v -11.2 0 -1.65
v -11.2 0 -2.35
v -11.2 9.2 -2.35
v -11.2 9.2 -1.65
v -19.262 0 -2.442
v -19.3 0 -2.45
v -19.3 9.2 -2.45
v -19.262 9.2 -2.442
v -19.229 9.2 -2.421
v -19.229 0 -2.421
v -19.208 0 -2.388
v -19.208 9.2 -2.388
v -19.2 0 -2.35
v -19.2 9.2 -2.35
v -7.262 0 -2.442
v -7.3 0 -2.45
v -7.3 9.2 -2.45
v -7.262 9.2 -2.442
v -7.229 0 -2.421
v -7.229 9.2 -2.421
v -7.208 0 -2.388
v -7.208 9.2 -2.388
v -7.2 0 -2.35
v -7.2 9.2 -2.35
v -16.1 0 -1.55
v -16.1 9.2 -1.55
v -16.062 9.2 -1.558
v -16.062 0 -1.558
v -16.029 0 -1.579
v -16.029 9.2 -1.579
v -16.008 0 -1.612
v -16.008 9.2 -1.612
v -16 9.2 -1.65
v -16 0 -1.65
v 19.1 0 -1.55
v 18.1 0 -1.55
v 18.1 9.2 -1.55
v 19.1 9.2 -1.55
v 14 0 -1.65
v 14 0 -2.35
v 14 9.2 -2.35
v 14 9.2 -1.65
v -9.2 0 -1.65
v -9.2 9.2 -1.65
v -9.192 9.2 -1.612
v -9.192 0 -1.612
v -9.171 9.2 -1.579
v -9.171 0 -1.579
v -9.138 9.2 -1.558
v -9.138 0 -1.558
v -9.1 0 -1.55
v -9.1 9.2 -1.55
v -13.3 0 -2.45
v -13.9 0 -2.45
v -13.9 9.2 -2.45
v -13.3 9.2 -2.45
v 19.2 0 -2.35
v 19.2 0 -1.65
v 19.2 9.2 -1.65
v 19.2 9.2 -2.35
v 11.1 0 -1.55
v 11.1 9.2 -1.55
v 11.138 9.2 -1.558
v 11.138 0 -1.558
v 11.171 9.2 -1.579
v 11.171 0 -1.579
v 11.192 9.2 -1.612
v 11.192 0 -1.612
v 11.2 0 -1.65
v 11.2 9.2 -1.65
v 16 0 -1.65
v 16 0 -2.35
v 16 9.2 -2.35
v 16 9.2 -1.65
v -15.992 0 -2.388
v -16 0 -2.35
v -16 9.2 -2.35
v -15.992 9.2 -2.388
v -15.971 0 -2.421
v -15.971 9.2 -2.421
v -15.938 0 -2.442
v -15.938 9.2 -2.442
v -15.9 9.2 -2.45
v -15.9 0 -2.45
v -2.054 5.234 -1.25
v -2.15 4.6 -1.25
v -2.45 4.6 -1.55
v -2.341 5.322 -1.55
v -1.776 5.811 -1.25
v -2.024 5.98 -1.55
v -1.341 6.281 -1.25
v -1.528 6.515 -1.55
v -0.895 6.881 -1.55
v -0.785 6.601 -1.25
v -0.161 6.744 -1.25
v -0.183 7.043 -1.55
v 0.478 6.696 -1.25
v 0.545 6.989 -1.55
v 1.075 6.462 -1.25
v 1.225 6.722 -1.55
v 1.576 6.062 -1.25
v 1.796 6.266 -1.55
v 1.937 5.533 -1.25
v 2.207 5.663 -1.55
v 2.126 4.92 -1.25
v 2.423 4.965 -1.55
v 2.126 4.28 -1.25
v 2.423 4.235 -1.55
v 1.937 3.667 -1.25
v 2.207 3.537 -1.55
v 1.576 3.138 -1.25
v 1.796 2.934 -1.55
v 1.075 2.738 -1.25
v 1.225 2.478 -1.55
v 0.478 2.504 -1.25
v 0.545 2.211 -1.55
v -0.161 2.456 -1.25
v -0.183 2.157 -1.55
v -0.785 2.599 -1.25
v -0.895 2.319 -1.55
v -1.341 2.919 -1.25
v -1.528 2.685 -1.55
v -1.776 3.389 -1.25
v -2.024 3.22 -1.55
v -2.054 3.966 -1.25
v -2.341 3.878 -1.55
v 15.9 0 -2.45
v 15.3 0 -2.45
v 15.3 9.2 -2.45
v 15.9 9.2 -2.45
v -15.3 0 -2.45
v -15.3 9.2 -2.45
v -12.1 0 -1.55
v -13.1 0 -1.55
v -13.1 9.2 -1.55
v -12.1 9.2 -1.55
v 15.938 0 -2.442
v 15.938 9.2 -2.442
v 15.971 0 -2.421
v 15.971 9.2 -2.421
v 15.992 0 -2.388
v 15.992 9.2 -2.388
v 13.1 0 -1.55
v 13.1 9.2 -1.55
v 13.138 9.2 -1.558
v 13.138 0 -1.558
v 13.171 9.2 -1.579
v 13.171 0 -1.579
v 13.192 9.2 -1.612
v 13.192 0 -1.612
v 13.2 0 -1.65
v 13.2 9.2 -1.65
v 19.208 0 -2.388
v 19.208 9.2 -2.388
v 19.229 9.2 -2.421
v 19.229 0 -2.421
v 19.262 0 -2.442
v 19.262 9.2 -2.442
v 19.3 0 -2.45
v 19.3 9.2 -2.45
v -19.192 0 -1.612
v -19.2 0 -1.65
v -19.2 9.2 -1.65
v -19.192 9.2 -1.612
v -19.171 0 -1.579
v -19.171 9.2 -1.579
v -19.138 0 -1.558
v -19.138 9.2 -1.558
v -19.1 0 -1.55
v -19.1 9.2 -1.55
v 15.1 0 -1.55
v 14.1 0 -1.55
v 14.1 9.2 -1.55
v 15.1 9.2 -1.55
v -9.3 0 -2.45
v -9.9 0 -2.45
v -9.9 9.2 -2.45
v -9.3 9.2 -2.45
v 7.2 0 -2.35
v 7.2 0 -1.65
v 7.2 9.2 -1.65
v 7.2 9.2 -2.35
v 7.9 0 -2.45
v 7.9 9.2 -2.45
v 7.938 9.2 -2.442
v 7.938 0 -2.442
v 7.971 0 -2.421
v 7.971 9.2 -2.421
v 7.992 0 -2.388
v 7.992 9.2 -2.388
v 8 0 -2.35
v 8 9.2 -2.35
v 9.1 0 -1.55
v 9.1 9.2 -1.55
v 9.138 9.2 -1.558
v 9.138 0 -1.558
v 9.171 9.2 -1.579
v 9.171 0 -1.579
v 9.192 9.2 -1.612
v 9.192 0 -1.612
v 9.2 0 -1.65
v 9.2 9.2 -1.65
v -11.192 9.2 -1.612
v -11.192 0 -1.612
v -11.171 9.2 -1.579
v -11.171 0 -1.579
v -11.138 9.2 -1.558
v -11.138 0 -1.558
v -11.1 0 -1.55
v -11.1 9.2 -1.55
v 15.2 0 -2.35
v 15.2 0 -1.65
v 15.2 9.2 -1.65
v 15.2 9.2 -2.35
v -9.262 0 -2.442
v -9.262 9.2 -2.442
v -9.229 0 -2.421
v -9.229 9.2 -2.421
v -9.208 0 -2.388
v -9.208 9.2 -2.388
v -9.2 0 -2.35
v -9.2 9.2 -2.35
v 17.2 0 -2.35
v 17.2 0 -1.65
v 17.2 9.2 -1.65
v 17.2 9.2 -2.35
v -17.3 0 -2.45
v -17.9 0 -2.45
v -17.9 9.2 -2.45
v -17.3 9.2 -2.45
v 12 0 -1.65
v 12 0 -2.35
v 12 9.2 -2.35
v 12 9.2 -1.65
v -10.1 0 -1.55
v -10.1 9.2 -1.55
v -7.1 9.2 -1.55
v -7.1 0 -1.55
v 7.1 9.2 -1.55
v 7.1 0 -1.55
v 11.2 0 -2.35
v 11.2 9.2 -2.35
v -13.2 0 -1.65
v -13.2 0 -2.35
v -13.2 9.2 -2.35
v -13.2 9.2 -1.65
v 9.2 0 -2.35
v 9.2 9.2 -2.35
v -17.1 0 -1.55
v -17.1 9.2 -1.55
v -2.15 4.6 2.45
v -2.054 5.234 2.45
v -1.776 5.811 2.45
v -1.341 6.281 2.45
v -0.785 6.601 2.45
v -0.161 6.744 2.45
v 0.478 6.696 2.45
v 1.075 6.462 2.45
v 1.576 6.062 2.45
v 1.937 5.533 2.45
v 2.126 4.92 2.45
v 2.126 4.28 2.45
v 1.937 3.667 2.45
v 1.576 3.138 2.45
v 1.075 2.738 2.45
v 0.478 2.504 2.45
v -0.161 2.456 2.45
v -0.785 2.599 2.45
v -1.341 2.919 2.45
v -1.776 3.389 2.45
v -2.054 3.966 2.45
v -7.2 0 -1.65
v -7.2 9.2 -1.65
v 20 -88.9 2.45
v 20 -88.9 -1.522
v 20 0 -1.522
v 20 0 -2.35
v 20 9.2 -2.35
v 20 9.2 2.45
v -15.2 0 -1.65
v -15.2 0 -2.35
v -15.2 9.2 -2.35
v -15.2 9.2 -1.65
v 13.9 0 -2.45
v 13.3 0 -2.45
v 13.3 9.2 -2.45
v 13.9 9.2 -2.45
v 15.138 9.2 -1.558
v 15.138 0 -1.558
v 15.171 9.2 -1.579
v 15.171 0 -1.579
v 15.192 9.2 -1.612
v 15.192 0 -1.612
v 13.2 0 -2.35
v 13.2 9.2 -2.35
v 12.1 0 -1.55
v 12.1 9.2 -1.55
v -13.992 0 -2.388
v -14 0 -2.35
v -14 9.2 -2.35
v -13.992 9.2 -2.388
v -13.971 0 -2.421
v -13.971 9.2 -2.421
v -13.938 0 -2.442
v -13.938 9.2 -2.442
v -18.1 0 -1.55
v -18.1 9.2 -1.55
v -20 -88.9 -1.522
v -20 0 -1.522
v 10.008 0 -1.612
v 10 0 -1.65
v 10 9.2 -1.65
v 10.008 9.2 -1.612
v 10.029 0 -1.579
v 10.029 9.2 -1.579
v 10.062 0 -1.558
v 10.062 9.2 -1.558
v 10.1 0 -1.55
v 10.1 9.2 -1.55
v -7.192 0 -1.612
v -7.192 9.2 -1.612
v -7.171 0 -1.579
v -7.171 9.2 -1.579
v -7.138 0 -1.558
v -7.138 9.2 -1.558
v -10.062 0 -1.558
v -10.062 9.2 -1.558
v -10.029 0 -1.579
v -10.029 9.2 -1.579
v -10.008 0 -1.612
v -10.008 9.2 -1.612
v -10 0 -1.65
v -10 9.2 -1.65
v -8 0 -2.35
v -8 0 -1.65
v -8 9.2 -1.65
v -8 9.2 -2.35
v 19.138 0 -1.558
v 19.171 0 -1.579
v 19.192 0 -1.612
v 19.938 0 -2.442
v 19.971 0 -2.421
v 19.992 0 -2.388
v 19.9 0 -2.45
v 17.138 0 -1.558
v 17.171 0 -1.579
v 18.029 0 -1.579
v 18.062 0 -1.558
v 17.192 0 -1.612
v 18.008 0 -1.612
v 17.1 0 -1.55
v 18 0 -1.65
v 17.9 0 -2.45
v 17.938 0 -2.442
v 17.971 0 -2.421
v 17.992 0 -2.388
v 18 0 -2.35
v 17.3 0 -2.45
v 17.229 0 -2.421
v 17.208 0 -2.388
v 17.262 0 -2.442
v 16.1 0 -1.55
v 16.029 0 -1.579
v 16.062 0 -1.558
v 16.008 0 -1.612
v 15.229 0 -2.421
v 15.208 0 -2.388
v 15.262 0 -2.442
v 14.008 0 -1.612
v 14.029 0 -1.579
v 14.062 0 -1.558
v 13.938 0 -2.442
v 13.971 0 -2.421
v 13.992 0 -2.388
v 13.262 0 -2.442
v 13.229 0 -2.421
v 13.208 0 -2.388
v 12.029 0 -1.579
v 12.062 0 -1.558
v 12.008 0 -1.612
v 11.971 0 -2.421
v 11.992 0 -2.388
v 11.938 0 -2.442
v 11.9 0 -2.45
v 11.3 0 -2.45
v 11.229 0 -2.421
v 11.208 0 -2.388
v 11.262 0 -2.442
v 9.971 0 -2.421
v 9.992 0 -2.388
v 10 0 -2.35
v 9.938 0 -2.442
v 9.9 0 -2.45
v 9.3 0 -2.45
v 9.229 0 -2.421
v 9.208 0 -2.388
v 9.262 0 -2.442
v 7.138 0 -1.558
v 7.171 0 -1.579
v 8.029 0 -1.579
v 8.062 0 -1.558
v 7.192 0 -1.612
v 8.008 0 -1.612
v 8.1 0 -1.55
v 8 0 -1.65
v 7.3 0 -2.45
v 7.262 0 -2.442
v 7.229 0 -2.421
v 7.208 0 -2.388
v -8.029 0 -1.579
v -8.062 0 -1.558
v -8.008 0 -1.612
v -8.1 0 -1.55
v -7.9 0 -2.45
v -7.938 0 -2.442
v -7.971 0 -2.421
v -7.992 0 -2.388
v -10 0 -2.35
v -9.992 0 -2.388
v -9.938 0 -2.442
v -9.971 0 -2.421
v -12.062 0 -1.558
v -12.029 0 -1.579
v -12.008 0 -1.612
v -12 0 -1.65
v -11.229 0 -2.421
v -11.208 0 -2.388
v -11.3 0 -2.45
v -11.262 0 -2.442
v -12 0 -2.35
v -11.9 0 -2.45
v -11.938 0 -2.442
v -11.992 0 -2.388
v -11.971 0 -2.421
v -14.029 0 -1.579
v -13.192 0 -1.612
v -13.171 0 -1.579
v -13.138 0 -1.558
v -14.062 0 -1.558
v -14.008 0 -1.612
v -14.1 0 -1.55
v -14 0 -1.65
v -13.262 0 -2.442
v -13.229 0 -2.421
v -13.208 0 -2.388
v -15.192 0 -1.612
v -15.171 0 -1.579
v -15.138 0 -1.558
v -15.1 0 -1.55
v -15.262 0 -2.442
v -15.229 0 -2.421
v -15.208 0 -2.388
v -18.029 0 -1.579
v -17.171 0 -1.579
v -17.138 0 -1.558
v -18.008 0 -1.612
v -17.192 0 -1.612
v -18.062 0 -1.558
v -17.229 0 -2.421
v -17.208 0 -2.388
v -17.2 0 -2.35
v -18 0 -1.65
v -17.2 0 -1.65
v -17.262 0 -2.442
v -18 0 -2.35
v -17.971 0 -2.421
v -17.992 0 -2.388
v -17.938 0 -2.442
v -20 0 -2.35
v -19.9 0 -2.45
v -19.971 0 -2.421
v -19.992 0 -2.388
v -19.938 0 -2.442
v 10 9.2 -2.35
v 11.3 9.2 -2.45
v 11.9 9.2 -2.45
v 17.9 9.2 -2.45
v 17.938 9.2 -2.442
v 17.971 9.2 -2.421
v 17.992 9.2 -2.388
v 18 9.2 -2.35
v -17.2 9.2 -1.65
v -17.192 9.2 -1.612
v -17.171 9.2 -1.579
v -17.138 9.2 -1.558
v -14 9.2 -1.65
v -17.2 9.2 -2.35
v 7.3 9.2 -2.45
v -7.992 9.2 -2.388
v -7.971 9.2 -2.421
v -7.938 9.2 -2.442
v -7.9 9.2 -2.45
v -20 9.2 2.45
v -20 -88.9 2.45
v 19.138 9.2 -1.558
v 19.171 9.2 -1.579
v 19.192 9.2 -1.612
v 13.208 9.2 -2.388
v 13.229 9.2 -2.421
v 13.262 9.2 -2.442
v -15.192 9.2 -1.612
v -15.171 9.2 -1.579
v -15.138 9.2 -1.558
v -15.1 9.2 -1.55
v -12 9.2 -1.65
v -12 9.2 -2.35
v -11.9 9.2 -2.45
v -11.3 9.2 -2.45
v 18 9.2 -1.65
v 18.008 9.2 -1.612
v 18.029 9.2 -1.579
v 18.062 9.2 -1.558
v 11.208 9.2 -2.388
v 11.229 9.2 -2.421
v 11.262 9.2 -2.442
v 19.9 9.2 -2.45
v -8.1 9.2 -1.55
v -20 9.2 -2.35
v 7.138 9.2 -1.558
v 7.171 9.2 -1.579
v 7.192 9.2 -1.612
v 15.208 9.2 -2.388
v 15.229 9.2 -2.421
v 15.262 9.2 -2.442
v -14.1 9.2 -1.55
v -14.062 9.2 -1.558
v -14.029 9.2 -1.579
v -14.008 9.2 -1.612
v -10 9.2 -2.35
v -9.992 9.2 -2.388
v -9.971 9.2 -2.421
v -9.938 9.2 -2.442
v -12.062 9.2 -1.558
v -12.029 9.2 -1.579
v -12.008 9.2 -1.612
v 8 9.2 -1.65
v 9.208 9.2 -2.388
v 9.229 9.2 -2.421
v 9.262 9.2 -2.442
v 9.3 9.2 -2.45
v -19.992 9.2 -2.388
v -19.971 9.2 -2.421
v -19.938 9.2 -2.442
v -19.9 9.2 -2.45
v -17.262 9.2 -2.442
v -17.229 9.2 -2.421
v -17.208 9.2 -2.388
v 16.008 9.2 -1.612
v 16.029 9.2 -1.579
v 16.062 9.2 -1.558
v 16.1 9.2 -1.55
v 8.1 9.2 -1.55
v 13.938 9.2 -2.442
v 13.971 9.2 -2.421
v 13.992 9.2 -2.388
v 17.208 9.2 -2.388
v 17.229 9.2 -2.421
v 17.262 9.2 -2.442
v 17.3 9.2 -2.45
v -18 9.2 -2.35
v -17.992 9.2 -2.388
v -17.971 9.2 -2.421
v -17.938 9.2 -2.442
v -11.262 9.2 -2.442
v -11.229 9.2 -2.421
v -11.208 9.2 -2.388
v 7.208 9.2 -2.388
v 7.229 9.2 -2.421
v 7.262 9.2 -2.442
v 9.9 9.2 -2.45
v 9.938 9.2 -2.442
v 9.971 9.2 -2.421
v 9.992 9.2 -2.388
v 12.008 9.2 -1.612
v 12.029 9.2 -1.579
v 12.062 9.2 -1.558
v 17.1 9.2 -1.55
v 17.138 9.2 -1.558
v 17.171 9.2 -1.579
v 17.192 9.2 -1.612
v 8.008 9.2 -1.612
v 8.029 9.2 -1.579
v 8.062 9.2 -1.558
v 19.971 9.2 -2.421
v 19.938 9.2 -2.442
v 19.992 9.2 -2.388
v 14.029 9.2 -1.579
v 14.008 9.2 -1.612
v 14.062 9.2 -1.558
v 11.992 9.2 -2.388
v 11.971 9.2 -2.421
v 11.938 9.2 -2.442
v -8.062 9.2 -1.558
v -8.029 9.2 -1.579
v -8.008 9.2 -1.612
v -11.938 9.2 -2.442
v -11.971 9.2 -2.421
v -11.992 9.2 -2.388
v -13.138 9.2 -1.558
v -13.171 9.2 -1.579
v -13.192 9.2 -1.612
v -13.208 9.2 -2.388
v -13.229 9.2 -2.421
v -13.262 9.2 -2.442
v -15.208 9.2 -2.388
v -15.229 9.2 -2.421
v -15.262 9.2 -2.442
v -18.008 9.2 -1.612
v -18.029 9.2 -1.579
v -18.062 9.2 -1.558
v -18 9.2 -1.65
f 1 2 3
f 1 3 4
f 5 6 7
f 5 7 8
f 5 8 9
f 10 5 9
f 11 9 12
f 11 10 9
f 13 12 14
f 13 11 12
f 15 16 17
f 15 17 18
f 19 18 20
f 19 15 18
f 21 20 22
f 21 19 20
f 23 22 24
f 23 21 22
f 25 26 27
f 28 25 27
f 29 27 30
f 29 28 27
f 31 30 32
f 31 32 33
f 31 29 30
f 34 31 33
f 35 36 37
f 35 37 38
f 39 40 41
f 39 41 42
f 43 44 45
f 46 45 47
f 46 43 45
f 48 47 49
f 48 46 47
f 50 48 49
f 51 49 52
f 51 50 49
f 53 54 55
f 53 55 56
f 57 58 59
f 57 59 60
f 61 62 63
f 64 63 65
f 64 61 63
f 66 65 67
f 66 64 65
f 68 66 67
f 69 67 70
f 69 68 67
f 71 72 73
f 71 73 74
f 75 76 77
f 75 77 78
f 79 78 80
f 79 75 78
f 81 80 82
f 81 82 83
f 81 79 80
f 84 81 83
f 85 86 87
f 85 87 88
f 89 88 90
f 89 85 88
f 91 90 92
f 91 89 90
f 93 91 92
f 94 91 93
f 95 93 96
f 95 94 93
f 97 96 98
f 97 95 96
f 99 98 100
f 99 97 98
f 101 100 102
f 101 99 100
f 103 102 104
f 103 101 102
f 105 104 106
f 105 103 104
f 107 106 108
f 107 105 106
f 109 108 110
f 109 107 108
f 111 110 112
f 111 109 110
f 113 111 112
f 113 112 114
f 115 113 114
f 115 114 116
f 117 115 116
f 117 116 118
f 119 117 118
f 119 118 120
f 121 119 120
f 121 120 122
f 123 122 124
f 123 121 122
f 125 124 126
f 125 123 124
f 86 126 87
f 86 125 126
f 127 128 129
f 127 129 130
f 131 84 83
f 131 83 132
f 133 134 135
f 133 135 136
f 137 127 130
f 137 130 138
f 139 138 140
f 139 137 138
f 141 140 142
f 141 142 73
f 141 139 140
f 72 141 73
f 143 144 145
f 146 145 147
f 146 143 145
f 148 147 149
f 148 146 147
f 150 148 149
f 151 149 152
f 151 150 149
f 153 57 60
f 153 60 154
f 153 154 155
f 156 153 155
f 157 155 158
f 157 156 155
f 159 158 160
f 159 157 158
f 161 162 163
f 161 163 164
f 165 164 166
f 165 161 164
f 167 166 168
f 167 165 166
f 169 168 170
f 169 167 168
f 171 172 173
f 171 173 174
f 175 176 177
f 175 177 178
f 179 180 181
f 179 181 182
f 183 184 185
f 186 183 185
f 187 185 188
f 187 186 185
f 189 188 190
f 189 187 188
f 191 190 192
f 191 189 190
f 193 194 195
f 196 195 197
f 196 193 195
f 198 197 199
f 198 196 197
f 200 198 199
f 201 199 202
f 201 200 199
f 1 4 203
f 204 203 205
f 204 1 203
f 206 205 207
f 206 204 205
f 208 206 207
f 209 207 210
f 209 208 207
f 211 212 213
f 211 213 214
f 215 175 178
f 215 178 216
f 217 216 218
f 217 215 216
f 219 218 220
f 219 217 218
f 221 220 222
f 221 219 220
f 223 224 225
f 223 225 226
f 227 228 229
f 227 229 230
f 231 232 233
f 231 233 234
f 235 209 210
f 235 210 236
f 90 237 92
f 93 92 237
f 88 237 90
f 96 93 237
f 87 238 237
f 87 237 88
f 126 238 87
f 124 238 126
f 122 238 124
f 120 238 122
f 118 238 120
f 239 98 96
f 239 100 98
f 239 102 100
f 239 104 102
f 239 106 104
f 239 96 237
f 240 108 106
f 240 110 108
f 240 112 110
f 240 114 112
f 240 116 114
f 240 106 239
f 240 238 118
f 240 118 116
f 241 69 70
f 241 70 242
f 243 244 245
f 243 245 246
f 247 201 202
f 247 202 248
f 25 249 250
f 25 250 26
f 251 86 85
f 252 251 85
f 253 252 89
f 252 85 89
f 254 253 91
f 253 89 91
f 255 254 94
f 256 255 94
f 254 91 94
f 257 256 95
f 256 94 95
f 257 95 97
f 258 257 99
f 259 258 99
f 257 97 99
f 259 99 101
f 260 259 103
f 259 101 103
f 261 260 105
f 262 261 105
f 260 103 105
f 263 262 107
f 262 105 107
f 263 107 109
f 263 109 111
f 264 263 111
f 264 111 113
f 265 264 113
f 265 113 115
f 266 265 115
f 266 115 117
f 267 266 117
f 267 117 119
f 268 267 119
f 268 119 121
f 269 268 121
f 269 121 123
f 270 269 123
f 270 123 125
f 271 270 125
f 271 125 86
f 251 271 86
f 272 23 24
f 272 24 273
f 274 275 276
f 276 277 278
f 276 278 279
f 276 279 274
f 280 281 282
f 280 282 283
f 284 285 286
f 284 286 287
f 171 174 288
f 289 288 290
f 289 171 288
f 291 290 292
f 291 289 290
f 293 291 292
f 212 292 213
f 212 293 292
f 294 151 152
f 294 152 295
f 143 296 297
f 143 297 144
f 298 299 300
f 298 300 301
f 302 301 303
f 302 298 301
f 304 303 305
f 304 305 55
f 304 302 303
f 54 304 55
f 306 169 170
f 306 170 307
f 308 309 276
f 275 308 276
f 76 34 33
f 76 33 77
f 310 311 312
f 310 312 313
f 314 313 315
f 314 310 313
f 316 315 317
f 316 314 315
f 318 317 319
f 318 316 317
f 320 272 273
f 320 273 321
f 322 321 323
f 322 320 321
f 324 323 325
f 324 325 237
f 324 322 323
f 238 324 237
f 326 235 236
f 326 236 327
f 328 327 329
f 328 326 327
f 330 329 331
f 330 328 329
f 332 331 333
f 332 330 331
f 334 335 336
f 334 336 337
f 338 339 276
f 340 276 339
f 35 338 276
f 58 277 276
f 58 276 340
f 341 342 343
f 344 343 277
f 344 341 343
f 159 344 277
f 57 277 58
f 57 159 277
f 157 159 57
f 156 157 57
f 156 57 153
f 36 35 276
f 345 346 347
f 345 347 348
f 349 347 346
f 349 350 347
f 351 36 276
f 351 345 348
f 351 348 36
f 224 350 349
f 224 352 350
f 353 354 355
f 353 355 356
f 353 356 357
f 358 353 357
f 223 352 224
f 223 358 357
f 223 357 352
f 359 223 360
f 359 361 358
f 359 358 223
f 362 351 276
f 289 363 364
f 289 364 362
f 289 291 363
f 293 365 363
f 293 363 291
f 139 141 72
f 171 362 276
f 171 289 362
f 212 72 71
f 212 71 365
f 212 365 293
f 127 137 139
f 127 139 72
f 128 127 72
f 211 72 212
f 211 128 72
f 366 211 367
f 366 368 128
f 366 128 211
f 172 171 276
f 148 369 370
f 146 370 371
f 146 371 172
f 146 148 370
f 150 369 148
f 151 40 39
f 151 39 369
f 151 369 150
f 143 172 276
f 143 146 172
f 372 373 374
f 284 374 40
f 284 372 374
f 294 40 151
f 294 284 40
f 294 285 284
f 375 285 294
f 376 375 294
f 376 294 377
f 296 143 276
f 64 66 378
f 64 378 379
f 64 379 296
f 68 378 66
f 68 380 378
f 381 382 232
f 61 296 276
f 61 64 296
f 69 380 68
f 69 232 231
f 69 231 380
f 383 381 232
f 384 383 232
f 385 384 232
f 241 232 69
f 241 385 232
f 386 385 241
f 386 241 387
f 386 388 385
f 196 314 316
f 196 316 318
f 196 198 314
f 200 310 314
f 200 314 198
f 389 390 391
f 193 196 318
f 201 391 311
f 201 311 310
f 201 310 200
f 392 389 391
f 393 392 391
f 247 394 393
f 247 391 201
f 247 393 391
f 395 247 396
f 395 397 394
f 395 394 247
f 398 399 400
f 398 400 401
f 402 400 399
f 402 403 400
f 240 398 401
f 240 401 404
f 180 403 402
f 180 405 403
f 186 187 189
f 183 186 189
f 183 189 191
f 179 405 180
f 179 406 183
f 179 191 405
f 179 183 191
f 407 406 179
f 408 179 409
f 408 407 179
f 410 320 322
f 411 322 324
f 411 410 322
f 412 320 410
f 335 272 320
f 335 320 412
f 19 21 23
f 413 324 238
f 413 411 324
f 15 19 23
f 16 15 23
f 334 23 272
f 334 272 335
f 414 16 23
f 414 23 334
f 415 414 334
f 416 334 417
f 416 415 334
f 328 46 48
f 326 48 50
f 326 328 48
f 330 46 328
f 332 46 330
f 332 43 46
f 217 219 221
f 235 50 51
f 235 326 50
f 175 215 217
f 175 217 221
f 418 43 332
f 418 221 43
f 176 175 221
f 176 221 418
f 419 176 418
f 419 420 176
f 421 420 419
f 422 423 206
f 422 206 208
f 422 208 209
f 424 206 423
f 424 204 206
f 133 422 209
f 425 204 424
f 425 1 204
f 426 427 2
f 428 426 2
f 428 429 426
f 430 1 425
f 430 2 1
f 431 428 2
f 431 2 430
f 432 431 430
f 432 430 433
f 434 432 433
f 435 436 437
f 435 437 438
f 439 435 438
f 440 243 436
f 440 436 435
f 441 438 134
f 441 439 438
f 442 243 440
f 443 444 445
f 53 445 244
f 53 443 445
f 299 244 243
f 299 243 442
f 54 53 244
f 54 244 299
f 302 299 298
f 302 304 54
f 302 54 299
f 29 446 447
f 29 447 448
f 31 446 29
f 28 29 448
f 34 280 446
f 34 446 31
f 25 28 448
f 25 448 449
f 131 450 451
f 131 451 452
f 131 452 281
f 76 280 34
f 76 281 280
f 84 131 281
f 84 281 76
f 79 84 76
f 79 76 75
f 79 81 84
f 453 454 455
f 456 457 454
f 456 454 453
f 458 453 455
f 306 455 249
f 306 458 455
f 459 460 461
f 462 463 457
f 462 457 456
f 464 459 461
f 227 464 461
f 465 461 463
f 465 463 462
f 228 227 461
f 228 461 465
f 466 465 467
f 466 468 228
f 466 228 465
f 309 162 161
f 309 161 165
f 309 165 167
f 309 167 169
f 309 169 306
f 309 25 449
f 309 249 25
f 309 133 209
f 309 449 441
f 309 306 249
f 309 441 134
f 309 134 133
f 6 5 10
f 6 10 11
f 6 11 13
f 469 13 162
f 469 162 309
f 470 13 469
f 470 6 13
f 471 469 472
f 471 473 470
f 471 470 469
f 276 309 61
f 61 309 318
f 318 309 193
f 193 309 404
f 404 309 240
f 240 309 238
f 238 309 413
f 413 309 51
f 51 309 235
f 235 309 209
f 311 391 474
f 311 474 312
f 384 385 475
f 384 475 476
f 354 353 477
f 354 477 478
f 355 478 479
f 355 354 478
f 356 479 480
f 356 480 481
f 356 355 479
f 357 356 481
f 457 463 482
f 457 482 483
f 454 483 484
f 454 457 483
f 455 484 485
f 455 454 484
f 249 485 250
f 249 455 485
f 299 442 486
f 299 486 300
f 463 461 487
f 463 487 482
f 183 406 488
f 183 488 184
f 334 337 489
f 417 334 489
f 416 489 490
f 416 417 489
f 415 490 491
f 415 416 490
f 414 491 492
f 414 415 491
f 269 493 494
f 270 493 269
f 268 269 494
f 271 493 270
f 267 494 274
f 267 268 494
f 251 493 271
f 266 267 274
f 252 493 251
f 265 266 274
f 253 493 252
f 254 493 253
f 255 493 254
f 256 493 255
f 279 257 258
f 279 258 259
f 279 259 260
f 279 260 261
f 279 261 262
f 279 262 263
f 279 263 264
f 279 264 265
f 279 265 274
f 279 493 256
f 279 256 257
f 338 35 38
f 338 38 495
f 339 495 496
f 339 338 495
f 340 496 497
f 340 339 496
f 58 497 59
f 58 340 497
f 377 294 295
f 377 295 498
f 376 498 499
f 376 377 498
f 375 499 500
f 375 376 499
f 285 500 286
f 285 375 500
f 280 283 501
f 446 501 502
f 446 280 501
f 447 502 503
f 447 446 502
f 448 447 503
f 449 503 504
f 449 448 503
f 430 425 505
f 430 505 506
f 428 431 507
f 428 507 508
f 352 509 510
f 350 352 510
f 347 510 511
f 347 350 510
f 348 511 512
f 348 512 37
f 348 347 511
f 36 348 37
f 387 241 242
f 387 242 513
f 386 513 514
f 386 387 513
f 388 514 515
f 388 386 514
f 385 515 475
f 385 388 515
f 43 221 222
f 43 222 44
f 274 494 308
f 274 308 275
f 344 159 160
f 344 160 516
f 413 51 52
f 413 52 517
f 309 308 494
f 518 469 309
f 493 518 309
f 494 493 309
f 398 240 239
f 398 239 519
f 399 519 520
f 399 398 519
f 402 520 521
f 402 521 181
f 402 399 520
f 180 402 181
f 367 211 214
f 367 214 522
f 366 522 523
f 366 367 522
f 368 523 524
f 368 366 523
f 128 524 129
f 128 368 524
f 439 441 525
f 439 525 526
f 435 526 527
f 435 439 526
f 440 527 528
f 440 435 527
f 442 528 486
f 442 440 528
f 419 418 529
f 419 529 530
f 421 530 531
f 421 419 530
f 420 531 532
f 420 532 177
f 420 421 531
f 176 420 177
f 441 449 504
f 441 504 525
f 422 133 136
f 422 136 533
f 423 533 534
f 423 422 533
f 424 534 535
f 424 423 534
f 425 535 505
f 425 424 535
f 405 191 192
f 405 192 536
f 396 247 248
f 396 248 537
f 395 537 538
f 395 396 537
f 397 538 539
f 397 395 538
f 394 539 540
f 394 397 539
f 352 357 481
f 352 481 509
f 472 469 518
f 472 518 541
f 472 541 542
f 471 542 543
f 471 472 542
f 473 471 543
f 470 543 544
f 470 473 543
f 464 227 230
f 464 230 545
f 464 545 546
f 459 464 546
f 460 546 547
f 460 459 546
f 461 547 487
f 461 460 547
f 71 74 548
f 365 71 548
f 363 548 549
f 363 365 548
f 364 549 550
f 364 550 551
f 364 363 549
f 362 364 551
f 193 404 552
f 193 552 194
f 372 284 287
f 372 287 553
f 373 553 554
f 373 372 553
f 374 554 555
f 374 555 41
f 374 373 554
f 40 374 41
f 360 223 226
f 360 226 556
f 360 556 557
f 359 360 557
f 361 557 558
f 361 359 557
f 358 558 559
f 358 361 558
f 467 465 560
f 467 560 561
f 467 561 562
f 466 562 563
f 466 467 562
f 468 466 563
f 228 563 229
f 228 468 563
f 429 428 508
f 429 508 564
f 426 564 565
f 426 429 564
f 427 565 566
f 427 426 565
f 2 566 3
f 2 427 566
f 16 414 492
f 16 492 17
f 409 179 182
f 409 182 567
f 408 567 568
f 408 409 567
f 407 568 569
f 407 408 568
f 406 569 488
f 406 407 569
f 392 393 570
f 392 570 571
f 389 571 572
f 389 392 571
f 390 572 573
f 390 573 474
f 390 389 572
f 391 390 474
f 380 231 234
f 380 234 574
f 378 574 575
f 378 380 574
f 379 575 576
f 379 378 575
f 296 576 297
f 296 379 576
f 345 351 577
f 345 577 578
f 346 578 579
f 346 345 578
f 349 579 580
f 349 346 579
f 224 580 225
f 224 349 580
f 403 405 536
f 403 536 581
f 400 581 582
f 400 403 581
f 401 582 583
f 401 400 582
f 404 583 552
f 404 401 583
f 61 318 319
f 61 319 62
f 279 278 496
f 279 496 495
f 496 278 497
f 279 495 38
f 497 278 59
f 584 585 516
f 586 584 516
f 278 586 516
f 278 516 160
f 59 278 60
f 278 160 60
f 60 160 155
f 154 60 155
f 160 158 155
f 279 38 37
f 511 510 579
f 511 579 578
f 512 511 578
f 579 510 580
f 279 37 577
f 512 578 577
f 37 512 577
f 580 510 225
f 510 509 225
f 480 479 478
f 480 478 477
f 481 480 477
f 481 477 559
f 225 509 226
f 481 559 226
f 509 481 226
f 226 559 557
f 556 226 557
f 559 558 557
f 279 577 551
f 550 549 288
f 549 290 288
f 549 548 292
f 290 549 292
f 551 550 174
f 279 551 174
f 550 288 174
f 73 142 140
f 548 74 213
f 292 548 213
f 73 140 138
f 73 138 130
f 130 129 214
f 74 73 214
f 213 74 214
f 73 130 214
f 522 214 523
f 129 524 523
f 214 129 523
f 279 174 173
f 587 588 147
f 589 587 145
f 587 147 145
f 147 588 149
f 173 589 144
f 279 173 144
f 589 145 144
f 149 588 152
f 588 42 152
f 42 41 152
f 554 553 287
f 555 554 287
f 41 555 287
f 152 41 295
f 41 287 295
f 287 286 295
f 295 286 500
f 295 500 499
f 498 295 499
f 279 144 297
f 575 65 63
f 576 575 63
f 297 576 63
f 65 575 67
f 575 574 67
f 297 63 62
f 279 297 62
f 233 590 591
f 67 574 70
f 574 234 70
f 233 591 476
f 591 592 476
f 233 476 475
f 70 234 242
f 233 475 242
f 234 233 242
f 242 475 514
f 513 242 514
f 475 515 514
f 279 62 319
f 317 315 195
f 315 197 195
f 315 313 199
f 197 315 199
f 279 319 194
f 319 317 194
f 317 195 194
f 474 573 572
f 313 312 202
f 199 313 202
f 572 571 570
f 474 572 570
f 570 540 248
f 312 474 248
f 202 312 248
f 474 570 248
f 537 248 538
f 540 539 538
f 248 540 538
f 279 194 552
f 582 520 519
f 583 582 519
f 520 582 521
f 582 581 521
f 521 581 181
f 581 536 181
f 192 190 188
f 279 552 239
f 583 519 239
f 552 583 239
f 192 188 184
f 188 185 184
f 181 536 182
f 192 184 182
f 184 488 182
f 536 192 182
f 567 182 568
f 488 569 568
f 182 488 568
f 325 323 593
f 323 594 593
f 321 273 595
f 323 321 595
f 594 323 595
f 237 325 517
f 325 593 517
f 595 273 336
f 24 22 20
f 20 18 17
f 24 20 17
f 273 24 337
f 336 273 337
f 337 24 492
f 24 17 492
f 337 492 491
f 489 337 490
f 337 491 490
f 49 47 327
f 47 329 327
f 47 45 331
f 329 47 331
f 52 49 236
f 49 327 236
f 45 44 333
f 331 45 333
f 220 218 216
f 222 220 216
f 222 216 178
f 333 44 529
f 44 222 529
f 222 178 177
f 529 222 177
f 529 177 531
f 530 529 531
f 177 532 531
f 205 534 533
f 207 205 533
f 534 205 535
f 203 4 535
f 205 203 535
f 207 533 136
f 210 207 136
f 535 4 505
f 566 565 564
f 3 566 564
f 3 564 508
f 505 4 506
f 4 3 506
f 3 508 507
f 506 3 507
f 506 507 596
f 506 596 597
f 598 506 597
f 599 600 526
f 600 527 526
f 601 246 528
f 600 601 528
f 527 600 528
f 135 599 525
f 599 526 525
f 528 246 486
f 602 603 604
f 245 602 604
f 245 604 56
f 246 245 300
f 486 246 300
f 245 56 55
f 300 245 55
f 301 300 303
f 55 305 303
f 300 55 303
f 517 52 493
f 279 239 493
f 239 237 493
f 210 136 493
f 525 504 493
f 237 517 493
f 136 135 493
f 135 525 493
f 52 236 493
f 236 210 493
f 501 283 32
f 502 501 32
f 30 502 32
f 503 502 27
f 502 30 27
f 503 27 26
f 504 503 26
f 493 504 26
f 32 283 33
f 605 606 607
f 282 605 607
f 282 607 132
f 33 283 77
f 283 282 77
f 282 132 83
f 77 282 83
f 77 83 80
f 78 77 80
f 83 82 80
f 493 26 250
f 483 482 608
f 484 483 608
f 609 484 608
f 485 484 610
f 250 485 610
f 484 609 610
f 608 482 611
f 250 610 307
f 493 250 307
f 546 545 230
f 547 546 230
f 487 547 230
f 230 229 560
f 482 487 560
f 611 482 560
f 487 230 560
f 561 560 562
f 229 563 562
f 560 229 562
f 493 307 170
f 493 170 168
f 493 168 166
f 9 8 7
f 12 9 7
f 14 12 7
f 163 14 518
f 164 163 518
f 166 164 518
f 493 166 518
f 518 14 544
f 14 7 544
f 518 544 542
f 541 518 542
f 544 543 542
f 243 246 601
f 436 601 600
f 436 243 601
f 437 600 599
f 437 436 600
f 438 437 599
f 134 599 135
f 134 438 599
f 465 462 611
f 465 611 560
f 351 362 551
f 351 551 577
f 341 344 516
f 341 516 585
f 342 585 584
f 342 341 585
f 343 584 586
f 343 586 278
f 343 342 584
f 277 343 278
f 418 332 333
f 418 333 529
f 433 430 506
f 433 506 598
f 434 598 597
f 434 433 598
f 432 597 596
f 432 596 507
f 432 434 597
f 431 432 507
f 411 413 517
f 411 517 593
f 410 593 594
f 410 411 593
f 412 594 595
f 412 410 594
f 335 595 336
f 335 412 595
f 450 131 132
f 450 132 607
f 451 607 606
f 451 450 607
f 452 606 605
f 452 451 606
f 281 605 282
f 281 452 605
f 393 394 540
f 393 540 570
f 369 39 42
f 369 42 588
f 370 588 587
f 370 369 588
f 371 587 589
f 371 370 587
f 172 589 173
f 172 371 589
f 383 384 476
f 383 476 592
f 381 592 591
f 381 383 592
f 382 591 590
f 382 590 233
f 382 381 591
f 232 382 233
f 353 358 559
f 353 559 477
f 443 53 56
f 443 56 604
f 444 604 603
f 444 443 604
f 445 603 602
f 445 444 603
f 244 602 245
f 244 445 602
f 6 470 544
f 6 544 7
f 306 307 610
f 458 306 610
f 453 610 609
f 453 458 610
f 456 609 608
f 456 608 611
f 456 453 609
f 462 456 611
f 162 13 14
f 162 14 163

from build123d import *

# Parameters (mm, degrees)
RESSALTO_EXTRUS_O2_DEPTH = 9.2
ESBO_O5_R                = 2.15
CORTE_EXTRUS_O2_DEPTH    = 9.2
CHANFRO2_SIZE            = 0.3
SKETCH1_W                = 40
SKETCH1_H                = 3.972261678
BOSS_EXTRUDE1_DEPTH      = 88.9


with BuildPart() as part:
    # Esboço4 → Ressalto-extrusão2 (new body)
    with BuildSketch(Plane(origin=(0, 0, 0), x_dir=(1, 0, 0), z_dir=(0, 1, 0))):
        with BuildLine():
            Line((-19.2, 2.35), (-19.2, 1.65))
            ThreePointArc((-19.2, 1.65), (-19.170710678, 1.579289322), (-19.1, 1.55))
            Line((-19.1, 1.55), (-18.1, 1.55))
            ThreePointArc((-18.1, 1.55), (-18.029289322, 1.579289322), (-18, 1.65))
            Line((-18, 1.65), (-18, 2.35))
            ThreePointArc((-18, 2.35), (-17.970710678, 2.420710678), (-17.9, 2.45))
            Line((-17.9, 2.45), (-17.3, 2.45))
            ThreePointArc((-17.3, 2.45), (-17.229289322, 2.420710678), (-17.2, 2.35))
            Line((-17.2, 2.35), (-17.2, 1.65))
            ThreePointArc((-17.2, 1.65), (-17.170710678, 1.579289322), (-17.1, 1.55))
            Line((-17.1, 1.55), (-16.1, 1.55))
            ThreePointArc((-16.1, 1.55), (-16.029289322, 1.579289322), (-16, 1.65))
            Line((-16, 1.65), (-16, 2.35))
            ThreePointArc((-16, 2.35), (-15.970710678, 2.420710678), (-15.9, 2.45))
            Line((-15.9, 2.45), (-15.3, 2.45))
            ThreePointArc((-15.3, 2.45), (-15.229289322, 2.420710678), (-15.2, 2.35))
            Line((-15.2, 2.35), (-15.2, 1.65))
            ThreePointArc((-15.2, 1.65), (-15.170710678, 1.579289322), (-15.1, 1.55))
            Line((-15.1, 1.55), (-14.1, 1.55))
            ThreePointArc((-14.1, 1.55), (-14.029289322, 1.579289322), (-14, 1.65))
            Line((-14, 1.65), (-14, 2.35))
            ThreePointArc((-14, 2.35), (-13.970710678, 2.420710678), (-13.9, 2.45))
            Line((-13.9, 2.45), (-13.3, 2.45))
            ThreePointArc((-13.3, 2.45), (-13.229289322, 2.420710678), (-13.2, 2.35))
            Line((-13.2, 2.35), (-13.2, 1.65))
            ThreePointArc((-13.2, 1.65), (-13.170710678, 1.579289322), (-13.1, 1.55))
            Line((-13.1, 1.55), (-12.1, 1.55))
            ThreePointArc((-12.1, 1.55), (-12.029289322, 1.579289322), (-12, 1.65))
            Line((-12, 1.65), (-12, 2.35))
            ThreePointArc((-12, 2.35), (-11.970710678, 2.420710678), (-11.9, 2.45))
            Line((-11.9, 2.45), (-11.3, 2.45))
            ThreePointArc((-11.3, 2.45), (-11.229289322, 2.420710678), (-11.2, 2.35))
            Line((-11.2, 2.35), (-11.2, 1.65))
            ThreePointArc((-11.2, 1.65), (-11.170710678, 1.579289322), (-11.1, 1.55))
            Line((-11.1, 1.55), (-10.1, 1.55))
            ThreePointArc((-10.1, 1.55), (-10.029289322, 1.579289322), (-10, 1.65))
            Line((-10, 1.65), (-10, 2.35))
            ThreePointArc((-10, 2.35), (-9.970710678, 2.420710678), (-9.9, 2.45))
            Line((-9.9, 2.45), (-9.3, 2.45))
            ThreePointArc((-9.3, 2.45), (-9.229289322, 2.420710678), (-9.2, 2.35))
            Line((-9.2, 2.35), (-9.2, 1.65))
            ThreePointArc((-9.2, 1.65), (-9.170710678, 1.579289322), (-9.1, 1.55))
            Line((-9.1, 1.55), (-8.1, 1.55))
            ThreePointArc((-8.1, 1.55), (-8.029289322, 1.579289322), (-8, 1.65))
            Line((-8, 1.65), (-8, 2.35))
            ThreePointArc((-8, 2.35), (-7.970710678, 2.420710678), (-7.9, 2.45))
            Line((-7.9, 2.45), (-7.3, 2.45))
            ThreePointArc((-7.3, 2.45), (-7.229289322, 2.420710678), (-7.2, 2.35))
            Line((-7.2, 2.35), (-7.2, 1.65))
            ThreePointArc((-7.2, 1.65), (-7.170710678, 1.579289322), (-7.1, 1.55))
            Line((-7.1, 1.55), (7.1, 1.55))
            ThreePointArc((7.1, 1.55), (7.170710678, 1.579289322), (7.2, 1.65))
            Line((7.2, 1.65), (7.2, 2.35))
            ThreePointArc((7.2, 2.35), (7.229289322, 2.420710678), (7.3, 2.45))
            Line((7.3, 2.45), (7.9, 2.45))
            ThreePointArc((7.9, 2.45), (7.970710678, 2.420710678), (8, 2.35))
            Line((8, 2.35), (8, 1.65))
            ThreePointArc((8, 1.65), (8.029289322, 1.579289322), (8.1, 1.55))
            Line((8.1, 1.55), (9.1, 1.55))
            ThreePointArc((9.1, 1.55), (9.170710678, 1.579289322), (9.2, 1.65))
            Line((9.2, 1.65), (9.2, 2.35))
            ThreePointArc((9.2, 2.35), (9.229289322, 2.420710678), (9.3, 2.45))
            Line((9.3, 2.45), (9.9, 2.45))
            ThreePointArc((9.9, 2.45), (9.970710678, 2.420710678), (10, 2.35))
            Line((10, 2.35), (10, 1.65))
            ThreePointArc((10, 1.65), (10.029289322, 1.579289322), (10.1, 1.55))
            Line((10.1, 1.55), (11.1, 1.55))
            ThreePointArc((11.1, 1.55), (11.170710678, 1.579289322), (11.2, 1.65))
            Line((11.2, 1.65), (11.2, 2.35))
            ThreePointArc((11.2, 2.35), (11.229289322, 2.420710678), (11.3, 2.45))
            Line((11.3, 2.45), (11.9, 2.45))
            ThreePointArc((11.9, 2.45), (11.970710678, 2.420710678), (12, 2.35))
            Line((12, 2.35), (12, 1.65))
            ThreePointArc((12, 1.65), (12.029289322, 1.579289322), (12.1, 1.55))
            Line((12.1, 1.55), (13.1, 1.55))
            ThreePointArc((13.1, 1.55), (13.170710678, 1.579289322), (13.2, 1.65))
            Line((13.2, 1.65), (13.2, 2.35))
            ThreePointArc((13.2, 2.35), (13.229289322, 2.420710678), (13.3, 2.45))
            Line((13.3, 2.45), (13.9, 2.45))
            ThreePointArc((13.9, 2.45), (13.970710678, 2.420710678), (14, 2.35))
            Line((14, 2.35), (14, 1.65))
            ThreePointArc((14, 1.65), (14.029289322, 1.579289322), (14.1, 1.55))
            Line((14.1, 1.55), (15.1, 1.55))
            ThreePointArc((15.1, 1.55), (15.170710678, 1.579289322), (15.2, 1.65))
            Line((15.2, 1.65), (15.2, 2.35))
            ThreePointArc((15.2, 2.35), (15.229289322, 2.420710678), (15.3, 2.45))
            Line((15.3, 2.45), (15.9, 2.45))
            ThreePointArc((15.9, 2.45), (15.970710678, 2.420710678), (16, 2.35))
            Line((16, 2.35), (16, 1.65))
            ThreePointArc((16, 1.65), (16.029289322, 1.579289322), (16.1, 1.55))
            Line((16.1, 1.55), (17.1, 1.55))
            ThreePointArc((17.1, 1.55), (17.170710678, 1.579289322), (17.2, 1.65))
            Line((17.2, 1.65), (17.2, 2.35))
            ThreePointArc((17.2, 2.35), (17.229289322, 2.420710678), (17.3, 2.45))
            Line((17.3, 2.45), (17.9, 2.45))
            ThreePointArc((17.9, 2.45), (17.970710678, 2.420710678), (18, 2.35))
            Line((18, 2.35), (18, 1.65))
            ThreePointArc((18, 1.65), (18.029289322, 1.579289322), (18.1, 1.55))
            Line((18.1, 1.55), (19.1, 1.55))
            ThreePointArc((19.1, 1.55), (19.170710678, 1.579289322), (19.2, 1.65))
            Line((19.2, 1.65), (19.2, 2.35))
            ThreePointArc((19.2, 2.35), (19.229289322, 2.420710678), (19.3, 2.45))
            Line((19.3, 2.45), (19.9, 2.45))
            ThreePointArc((19.9, 2.45), (19.970710678, 2.420710678), (20, 2.35))
            Line((20, 2.35), (20, -2.45))
            Line((20, -2.45), (-20, -2.45))
            Line((-20, -2.45), (-20, 2.35))
            ThreePointArc((-20, 2.35), (-19.970710678, 2.420710678), (-19.9, 2.45))
            Line((-19.9, 2.45), (-19.3, 2.45))
            ThreePointArc((-19.3, 2.45), (-19.229289322, 2.420710678), (-19.2, 2.35))
        make_face()
    extrude(amount=RESSALTO_EXTRUS_O2_DEPTH)

    # Esboço5 → Corte-extrusão2 (cut)
    with BuildSketch(Plane(origin=(0, 0, -1.55), x_dir=(-1, 0, 0), z_dir=(0, 0, -1))):
        with Locations((0, 4.6)):
            Circle(ESBO_O5_R)
    extrude(amount=-CORTE_EXTRUS_O2_DEPTH, mode=Mode.SUBTRACT)

    # Chanfro2
    chanfro2_edges = [part.edges().sort_by_distance(p)[0] for p in [
        (2.15, 4.6, -1.55),
    ]]
    chamfer(chanfro2_edges, length=CHANFRO2_SIZE)

    # Sketch1 → Boss-Extrude1 (add)
    with BuildSketch(Plane.XZ):
        with Locations((0, 0.463869161)):
            Rectangle(SKETCH1_W, SKETCH1_H)
    extrude(amount=BOSS_EXTRUDE1_DEPTH)


solid = part.part
